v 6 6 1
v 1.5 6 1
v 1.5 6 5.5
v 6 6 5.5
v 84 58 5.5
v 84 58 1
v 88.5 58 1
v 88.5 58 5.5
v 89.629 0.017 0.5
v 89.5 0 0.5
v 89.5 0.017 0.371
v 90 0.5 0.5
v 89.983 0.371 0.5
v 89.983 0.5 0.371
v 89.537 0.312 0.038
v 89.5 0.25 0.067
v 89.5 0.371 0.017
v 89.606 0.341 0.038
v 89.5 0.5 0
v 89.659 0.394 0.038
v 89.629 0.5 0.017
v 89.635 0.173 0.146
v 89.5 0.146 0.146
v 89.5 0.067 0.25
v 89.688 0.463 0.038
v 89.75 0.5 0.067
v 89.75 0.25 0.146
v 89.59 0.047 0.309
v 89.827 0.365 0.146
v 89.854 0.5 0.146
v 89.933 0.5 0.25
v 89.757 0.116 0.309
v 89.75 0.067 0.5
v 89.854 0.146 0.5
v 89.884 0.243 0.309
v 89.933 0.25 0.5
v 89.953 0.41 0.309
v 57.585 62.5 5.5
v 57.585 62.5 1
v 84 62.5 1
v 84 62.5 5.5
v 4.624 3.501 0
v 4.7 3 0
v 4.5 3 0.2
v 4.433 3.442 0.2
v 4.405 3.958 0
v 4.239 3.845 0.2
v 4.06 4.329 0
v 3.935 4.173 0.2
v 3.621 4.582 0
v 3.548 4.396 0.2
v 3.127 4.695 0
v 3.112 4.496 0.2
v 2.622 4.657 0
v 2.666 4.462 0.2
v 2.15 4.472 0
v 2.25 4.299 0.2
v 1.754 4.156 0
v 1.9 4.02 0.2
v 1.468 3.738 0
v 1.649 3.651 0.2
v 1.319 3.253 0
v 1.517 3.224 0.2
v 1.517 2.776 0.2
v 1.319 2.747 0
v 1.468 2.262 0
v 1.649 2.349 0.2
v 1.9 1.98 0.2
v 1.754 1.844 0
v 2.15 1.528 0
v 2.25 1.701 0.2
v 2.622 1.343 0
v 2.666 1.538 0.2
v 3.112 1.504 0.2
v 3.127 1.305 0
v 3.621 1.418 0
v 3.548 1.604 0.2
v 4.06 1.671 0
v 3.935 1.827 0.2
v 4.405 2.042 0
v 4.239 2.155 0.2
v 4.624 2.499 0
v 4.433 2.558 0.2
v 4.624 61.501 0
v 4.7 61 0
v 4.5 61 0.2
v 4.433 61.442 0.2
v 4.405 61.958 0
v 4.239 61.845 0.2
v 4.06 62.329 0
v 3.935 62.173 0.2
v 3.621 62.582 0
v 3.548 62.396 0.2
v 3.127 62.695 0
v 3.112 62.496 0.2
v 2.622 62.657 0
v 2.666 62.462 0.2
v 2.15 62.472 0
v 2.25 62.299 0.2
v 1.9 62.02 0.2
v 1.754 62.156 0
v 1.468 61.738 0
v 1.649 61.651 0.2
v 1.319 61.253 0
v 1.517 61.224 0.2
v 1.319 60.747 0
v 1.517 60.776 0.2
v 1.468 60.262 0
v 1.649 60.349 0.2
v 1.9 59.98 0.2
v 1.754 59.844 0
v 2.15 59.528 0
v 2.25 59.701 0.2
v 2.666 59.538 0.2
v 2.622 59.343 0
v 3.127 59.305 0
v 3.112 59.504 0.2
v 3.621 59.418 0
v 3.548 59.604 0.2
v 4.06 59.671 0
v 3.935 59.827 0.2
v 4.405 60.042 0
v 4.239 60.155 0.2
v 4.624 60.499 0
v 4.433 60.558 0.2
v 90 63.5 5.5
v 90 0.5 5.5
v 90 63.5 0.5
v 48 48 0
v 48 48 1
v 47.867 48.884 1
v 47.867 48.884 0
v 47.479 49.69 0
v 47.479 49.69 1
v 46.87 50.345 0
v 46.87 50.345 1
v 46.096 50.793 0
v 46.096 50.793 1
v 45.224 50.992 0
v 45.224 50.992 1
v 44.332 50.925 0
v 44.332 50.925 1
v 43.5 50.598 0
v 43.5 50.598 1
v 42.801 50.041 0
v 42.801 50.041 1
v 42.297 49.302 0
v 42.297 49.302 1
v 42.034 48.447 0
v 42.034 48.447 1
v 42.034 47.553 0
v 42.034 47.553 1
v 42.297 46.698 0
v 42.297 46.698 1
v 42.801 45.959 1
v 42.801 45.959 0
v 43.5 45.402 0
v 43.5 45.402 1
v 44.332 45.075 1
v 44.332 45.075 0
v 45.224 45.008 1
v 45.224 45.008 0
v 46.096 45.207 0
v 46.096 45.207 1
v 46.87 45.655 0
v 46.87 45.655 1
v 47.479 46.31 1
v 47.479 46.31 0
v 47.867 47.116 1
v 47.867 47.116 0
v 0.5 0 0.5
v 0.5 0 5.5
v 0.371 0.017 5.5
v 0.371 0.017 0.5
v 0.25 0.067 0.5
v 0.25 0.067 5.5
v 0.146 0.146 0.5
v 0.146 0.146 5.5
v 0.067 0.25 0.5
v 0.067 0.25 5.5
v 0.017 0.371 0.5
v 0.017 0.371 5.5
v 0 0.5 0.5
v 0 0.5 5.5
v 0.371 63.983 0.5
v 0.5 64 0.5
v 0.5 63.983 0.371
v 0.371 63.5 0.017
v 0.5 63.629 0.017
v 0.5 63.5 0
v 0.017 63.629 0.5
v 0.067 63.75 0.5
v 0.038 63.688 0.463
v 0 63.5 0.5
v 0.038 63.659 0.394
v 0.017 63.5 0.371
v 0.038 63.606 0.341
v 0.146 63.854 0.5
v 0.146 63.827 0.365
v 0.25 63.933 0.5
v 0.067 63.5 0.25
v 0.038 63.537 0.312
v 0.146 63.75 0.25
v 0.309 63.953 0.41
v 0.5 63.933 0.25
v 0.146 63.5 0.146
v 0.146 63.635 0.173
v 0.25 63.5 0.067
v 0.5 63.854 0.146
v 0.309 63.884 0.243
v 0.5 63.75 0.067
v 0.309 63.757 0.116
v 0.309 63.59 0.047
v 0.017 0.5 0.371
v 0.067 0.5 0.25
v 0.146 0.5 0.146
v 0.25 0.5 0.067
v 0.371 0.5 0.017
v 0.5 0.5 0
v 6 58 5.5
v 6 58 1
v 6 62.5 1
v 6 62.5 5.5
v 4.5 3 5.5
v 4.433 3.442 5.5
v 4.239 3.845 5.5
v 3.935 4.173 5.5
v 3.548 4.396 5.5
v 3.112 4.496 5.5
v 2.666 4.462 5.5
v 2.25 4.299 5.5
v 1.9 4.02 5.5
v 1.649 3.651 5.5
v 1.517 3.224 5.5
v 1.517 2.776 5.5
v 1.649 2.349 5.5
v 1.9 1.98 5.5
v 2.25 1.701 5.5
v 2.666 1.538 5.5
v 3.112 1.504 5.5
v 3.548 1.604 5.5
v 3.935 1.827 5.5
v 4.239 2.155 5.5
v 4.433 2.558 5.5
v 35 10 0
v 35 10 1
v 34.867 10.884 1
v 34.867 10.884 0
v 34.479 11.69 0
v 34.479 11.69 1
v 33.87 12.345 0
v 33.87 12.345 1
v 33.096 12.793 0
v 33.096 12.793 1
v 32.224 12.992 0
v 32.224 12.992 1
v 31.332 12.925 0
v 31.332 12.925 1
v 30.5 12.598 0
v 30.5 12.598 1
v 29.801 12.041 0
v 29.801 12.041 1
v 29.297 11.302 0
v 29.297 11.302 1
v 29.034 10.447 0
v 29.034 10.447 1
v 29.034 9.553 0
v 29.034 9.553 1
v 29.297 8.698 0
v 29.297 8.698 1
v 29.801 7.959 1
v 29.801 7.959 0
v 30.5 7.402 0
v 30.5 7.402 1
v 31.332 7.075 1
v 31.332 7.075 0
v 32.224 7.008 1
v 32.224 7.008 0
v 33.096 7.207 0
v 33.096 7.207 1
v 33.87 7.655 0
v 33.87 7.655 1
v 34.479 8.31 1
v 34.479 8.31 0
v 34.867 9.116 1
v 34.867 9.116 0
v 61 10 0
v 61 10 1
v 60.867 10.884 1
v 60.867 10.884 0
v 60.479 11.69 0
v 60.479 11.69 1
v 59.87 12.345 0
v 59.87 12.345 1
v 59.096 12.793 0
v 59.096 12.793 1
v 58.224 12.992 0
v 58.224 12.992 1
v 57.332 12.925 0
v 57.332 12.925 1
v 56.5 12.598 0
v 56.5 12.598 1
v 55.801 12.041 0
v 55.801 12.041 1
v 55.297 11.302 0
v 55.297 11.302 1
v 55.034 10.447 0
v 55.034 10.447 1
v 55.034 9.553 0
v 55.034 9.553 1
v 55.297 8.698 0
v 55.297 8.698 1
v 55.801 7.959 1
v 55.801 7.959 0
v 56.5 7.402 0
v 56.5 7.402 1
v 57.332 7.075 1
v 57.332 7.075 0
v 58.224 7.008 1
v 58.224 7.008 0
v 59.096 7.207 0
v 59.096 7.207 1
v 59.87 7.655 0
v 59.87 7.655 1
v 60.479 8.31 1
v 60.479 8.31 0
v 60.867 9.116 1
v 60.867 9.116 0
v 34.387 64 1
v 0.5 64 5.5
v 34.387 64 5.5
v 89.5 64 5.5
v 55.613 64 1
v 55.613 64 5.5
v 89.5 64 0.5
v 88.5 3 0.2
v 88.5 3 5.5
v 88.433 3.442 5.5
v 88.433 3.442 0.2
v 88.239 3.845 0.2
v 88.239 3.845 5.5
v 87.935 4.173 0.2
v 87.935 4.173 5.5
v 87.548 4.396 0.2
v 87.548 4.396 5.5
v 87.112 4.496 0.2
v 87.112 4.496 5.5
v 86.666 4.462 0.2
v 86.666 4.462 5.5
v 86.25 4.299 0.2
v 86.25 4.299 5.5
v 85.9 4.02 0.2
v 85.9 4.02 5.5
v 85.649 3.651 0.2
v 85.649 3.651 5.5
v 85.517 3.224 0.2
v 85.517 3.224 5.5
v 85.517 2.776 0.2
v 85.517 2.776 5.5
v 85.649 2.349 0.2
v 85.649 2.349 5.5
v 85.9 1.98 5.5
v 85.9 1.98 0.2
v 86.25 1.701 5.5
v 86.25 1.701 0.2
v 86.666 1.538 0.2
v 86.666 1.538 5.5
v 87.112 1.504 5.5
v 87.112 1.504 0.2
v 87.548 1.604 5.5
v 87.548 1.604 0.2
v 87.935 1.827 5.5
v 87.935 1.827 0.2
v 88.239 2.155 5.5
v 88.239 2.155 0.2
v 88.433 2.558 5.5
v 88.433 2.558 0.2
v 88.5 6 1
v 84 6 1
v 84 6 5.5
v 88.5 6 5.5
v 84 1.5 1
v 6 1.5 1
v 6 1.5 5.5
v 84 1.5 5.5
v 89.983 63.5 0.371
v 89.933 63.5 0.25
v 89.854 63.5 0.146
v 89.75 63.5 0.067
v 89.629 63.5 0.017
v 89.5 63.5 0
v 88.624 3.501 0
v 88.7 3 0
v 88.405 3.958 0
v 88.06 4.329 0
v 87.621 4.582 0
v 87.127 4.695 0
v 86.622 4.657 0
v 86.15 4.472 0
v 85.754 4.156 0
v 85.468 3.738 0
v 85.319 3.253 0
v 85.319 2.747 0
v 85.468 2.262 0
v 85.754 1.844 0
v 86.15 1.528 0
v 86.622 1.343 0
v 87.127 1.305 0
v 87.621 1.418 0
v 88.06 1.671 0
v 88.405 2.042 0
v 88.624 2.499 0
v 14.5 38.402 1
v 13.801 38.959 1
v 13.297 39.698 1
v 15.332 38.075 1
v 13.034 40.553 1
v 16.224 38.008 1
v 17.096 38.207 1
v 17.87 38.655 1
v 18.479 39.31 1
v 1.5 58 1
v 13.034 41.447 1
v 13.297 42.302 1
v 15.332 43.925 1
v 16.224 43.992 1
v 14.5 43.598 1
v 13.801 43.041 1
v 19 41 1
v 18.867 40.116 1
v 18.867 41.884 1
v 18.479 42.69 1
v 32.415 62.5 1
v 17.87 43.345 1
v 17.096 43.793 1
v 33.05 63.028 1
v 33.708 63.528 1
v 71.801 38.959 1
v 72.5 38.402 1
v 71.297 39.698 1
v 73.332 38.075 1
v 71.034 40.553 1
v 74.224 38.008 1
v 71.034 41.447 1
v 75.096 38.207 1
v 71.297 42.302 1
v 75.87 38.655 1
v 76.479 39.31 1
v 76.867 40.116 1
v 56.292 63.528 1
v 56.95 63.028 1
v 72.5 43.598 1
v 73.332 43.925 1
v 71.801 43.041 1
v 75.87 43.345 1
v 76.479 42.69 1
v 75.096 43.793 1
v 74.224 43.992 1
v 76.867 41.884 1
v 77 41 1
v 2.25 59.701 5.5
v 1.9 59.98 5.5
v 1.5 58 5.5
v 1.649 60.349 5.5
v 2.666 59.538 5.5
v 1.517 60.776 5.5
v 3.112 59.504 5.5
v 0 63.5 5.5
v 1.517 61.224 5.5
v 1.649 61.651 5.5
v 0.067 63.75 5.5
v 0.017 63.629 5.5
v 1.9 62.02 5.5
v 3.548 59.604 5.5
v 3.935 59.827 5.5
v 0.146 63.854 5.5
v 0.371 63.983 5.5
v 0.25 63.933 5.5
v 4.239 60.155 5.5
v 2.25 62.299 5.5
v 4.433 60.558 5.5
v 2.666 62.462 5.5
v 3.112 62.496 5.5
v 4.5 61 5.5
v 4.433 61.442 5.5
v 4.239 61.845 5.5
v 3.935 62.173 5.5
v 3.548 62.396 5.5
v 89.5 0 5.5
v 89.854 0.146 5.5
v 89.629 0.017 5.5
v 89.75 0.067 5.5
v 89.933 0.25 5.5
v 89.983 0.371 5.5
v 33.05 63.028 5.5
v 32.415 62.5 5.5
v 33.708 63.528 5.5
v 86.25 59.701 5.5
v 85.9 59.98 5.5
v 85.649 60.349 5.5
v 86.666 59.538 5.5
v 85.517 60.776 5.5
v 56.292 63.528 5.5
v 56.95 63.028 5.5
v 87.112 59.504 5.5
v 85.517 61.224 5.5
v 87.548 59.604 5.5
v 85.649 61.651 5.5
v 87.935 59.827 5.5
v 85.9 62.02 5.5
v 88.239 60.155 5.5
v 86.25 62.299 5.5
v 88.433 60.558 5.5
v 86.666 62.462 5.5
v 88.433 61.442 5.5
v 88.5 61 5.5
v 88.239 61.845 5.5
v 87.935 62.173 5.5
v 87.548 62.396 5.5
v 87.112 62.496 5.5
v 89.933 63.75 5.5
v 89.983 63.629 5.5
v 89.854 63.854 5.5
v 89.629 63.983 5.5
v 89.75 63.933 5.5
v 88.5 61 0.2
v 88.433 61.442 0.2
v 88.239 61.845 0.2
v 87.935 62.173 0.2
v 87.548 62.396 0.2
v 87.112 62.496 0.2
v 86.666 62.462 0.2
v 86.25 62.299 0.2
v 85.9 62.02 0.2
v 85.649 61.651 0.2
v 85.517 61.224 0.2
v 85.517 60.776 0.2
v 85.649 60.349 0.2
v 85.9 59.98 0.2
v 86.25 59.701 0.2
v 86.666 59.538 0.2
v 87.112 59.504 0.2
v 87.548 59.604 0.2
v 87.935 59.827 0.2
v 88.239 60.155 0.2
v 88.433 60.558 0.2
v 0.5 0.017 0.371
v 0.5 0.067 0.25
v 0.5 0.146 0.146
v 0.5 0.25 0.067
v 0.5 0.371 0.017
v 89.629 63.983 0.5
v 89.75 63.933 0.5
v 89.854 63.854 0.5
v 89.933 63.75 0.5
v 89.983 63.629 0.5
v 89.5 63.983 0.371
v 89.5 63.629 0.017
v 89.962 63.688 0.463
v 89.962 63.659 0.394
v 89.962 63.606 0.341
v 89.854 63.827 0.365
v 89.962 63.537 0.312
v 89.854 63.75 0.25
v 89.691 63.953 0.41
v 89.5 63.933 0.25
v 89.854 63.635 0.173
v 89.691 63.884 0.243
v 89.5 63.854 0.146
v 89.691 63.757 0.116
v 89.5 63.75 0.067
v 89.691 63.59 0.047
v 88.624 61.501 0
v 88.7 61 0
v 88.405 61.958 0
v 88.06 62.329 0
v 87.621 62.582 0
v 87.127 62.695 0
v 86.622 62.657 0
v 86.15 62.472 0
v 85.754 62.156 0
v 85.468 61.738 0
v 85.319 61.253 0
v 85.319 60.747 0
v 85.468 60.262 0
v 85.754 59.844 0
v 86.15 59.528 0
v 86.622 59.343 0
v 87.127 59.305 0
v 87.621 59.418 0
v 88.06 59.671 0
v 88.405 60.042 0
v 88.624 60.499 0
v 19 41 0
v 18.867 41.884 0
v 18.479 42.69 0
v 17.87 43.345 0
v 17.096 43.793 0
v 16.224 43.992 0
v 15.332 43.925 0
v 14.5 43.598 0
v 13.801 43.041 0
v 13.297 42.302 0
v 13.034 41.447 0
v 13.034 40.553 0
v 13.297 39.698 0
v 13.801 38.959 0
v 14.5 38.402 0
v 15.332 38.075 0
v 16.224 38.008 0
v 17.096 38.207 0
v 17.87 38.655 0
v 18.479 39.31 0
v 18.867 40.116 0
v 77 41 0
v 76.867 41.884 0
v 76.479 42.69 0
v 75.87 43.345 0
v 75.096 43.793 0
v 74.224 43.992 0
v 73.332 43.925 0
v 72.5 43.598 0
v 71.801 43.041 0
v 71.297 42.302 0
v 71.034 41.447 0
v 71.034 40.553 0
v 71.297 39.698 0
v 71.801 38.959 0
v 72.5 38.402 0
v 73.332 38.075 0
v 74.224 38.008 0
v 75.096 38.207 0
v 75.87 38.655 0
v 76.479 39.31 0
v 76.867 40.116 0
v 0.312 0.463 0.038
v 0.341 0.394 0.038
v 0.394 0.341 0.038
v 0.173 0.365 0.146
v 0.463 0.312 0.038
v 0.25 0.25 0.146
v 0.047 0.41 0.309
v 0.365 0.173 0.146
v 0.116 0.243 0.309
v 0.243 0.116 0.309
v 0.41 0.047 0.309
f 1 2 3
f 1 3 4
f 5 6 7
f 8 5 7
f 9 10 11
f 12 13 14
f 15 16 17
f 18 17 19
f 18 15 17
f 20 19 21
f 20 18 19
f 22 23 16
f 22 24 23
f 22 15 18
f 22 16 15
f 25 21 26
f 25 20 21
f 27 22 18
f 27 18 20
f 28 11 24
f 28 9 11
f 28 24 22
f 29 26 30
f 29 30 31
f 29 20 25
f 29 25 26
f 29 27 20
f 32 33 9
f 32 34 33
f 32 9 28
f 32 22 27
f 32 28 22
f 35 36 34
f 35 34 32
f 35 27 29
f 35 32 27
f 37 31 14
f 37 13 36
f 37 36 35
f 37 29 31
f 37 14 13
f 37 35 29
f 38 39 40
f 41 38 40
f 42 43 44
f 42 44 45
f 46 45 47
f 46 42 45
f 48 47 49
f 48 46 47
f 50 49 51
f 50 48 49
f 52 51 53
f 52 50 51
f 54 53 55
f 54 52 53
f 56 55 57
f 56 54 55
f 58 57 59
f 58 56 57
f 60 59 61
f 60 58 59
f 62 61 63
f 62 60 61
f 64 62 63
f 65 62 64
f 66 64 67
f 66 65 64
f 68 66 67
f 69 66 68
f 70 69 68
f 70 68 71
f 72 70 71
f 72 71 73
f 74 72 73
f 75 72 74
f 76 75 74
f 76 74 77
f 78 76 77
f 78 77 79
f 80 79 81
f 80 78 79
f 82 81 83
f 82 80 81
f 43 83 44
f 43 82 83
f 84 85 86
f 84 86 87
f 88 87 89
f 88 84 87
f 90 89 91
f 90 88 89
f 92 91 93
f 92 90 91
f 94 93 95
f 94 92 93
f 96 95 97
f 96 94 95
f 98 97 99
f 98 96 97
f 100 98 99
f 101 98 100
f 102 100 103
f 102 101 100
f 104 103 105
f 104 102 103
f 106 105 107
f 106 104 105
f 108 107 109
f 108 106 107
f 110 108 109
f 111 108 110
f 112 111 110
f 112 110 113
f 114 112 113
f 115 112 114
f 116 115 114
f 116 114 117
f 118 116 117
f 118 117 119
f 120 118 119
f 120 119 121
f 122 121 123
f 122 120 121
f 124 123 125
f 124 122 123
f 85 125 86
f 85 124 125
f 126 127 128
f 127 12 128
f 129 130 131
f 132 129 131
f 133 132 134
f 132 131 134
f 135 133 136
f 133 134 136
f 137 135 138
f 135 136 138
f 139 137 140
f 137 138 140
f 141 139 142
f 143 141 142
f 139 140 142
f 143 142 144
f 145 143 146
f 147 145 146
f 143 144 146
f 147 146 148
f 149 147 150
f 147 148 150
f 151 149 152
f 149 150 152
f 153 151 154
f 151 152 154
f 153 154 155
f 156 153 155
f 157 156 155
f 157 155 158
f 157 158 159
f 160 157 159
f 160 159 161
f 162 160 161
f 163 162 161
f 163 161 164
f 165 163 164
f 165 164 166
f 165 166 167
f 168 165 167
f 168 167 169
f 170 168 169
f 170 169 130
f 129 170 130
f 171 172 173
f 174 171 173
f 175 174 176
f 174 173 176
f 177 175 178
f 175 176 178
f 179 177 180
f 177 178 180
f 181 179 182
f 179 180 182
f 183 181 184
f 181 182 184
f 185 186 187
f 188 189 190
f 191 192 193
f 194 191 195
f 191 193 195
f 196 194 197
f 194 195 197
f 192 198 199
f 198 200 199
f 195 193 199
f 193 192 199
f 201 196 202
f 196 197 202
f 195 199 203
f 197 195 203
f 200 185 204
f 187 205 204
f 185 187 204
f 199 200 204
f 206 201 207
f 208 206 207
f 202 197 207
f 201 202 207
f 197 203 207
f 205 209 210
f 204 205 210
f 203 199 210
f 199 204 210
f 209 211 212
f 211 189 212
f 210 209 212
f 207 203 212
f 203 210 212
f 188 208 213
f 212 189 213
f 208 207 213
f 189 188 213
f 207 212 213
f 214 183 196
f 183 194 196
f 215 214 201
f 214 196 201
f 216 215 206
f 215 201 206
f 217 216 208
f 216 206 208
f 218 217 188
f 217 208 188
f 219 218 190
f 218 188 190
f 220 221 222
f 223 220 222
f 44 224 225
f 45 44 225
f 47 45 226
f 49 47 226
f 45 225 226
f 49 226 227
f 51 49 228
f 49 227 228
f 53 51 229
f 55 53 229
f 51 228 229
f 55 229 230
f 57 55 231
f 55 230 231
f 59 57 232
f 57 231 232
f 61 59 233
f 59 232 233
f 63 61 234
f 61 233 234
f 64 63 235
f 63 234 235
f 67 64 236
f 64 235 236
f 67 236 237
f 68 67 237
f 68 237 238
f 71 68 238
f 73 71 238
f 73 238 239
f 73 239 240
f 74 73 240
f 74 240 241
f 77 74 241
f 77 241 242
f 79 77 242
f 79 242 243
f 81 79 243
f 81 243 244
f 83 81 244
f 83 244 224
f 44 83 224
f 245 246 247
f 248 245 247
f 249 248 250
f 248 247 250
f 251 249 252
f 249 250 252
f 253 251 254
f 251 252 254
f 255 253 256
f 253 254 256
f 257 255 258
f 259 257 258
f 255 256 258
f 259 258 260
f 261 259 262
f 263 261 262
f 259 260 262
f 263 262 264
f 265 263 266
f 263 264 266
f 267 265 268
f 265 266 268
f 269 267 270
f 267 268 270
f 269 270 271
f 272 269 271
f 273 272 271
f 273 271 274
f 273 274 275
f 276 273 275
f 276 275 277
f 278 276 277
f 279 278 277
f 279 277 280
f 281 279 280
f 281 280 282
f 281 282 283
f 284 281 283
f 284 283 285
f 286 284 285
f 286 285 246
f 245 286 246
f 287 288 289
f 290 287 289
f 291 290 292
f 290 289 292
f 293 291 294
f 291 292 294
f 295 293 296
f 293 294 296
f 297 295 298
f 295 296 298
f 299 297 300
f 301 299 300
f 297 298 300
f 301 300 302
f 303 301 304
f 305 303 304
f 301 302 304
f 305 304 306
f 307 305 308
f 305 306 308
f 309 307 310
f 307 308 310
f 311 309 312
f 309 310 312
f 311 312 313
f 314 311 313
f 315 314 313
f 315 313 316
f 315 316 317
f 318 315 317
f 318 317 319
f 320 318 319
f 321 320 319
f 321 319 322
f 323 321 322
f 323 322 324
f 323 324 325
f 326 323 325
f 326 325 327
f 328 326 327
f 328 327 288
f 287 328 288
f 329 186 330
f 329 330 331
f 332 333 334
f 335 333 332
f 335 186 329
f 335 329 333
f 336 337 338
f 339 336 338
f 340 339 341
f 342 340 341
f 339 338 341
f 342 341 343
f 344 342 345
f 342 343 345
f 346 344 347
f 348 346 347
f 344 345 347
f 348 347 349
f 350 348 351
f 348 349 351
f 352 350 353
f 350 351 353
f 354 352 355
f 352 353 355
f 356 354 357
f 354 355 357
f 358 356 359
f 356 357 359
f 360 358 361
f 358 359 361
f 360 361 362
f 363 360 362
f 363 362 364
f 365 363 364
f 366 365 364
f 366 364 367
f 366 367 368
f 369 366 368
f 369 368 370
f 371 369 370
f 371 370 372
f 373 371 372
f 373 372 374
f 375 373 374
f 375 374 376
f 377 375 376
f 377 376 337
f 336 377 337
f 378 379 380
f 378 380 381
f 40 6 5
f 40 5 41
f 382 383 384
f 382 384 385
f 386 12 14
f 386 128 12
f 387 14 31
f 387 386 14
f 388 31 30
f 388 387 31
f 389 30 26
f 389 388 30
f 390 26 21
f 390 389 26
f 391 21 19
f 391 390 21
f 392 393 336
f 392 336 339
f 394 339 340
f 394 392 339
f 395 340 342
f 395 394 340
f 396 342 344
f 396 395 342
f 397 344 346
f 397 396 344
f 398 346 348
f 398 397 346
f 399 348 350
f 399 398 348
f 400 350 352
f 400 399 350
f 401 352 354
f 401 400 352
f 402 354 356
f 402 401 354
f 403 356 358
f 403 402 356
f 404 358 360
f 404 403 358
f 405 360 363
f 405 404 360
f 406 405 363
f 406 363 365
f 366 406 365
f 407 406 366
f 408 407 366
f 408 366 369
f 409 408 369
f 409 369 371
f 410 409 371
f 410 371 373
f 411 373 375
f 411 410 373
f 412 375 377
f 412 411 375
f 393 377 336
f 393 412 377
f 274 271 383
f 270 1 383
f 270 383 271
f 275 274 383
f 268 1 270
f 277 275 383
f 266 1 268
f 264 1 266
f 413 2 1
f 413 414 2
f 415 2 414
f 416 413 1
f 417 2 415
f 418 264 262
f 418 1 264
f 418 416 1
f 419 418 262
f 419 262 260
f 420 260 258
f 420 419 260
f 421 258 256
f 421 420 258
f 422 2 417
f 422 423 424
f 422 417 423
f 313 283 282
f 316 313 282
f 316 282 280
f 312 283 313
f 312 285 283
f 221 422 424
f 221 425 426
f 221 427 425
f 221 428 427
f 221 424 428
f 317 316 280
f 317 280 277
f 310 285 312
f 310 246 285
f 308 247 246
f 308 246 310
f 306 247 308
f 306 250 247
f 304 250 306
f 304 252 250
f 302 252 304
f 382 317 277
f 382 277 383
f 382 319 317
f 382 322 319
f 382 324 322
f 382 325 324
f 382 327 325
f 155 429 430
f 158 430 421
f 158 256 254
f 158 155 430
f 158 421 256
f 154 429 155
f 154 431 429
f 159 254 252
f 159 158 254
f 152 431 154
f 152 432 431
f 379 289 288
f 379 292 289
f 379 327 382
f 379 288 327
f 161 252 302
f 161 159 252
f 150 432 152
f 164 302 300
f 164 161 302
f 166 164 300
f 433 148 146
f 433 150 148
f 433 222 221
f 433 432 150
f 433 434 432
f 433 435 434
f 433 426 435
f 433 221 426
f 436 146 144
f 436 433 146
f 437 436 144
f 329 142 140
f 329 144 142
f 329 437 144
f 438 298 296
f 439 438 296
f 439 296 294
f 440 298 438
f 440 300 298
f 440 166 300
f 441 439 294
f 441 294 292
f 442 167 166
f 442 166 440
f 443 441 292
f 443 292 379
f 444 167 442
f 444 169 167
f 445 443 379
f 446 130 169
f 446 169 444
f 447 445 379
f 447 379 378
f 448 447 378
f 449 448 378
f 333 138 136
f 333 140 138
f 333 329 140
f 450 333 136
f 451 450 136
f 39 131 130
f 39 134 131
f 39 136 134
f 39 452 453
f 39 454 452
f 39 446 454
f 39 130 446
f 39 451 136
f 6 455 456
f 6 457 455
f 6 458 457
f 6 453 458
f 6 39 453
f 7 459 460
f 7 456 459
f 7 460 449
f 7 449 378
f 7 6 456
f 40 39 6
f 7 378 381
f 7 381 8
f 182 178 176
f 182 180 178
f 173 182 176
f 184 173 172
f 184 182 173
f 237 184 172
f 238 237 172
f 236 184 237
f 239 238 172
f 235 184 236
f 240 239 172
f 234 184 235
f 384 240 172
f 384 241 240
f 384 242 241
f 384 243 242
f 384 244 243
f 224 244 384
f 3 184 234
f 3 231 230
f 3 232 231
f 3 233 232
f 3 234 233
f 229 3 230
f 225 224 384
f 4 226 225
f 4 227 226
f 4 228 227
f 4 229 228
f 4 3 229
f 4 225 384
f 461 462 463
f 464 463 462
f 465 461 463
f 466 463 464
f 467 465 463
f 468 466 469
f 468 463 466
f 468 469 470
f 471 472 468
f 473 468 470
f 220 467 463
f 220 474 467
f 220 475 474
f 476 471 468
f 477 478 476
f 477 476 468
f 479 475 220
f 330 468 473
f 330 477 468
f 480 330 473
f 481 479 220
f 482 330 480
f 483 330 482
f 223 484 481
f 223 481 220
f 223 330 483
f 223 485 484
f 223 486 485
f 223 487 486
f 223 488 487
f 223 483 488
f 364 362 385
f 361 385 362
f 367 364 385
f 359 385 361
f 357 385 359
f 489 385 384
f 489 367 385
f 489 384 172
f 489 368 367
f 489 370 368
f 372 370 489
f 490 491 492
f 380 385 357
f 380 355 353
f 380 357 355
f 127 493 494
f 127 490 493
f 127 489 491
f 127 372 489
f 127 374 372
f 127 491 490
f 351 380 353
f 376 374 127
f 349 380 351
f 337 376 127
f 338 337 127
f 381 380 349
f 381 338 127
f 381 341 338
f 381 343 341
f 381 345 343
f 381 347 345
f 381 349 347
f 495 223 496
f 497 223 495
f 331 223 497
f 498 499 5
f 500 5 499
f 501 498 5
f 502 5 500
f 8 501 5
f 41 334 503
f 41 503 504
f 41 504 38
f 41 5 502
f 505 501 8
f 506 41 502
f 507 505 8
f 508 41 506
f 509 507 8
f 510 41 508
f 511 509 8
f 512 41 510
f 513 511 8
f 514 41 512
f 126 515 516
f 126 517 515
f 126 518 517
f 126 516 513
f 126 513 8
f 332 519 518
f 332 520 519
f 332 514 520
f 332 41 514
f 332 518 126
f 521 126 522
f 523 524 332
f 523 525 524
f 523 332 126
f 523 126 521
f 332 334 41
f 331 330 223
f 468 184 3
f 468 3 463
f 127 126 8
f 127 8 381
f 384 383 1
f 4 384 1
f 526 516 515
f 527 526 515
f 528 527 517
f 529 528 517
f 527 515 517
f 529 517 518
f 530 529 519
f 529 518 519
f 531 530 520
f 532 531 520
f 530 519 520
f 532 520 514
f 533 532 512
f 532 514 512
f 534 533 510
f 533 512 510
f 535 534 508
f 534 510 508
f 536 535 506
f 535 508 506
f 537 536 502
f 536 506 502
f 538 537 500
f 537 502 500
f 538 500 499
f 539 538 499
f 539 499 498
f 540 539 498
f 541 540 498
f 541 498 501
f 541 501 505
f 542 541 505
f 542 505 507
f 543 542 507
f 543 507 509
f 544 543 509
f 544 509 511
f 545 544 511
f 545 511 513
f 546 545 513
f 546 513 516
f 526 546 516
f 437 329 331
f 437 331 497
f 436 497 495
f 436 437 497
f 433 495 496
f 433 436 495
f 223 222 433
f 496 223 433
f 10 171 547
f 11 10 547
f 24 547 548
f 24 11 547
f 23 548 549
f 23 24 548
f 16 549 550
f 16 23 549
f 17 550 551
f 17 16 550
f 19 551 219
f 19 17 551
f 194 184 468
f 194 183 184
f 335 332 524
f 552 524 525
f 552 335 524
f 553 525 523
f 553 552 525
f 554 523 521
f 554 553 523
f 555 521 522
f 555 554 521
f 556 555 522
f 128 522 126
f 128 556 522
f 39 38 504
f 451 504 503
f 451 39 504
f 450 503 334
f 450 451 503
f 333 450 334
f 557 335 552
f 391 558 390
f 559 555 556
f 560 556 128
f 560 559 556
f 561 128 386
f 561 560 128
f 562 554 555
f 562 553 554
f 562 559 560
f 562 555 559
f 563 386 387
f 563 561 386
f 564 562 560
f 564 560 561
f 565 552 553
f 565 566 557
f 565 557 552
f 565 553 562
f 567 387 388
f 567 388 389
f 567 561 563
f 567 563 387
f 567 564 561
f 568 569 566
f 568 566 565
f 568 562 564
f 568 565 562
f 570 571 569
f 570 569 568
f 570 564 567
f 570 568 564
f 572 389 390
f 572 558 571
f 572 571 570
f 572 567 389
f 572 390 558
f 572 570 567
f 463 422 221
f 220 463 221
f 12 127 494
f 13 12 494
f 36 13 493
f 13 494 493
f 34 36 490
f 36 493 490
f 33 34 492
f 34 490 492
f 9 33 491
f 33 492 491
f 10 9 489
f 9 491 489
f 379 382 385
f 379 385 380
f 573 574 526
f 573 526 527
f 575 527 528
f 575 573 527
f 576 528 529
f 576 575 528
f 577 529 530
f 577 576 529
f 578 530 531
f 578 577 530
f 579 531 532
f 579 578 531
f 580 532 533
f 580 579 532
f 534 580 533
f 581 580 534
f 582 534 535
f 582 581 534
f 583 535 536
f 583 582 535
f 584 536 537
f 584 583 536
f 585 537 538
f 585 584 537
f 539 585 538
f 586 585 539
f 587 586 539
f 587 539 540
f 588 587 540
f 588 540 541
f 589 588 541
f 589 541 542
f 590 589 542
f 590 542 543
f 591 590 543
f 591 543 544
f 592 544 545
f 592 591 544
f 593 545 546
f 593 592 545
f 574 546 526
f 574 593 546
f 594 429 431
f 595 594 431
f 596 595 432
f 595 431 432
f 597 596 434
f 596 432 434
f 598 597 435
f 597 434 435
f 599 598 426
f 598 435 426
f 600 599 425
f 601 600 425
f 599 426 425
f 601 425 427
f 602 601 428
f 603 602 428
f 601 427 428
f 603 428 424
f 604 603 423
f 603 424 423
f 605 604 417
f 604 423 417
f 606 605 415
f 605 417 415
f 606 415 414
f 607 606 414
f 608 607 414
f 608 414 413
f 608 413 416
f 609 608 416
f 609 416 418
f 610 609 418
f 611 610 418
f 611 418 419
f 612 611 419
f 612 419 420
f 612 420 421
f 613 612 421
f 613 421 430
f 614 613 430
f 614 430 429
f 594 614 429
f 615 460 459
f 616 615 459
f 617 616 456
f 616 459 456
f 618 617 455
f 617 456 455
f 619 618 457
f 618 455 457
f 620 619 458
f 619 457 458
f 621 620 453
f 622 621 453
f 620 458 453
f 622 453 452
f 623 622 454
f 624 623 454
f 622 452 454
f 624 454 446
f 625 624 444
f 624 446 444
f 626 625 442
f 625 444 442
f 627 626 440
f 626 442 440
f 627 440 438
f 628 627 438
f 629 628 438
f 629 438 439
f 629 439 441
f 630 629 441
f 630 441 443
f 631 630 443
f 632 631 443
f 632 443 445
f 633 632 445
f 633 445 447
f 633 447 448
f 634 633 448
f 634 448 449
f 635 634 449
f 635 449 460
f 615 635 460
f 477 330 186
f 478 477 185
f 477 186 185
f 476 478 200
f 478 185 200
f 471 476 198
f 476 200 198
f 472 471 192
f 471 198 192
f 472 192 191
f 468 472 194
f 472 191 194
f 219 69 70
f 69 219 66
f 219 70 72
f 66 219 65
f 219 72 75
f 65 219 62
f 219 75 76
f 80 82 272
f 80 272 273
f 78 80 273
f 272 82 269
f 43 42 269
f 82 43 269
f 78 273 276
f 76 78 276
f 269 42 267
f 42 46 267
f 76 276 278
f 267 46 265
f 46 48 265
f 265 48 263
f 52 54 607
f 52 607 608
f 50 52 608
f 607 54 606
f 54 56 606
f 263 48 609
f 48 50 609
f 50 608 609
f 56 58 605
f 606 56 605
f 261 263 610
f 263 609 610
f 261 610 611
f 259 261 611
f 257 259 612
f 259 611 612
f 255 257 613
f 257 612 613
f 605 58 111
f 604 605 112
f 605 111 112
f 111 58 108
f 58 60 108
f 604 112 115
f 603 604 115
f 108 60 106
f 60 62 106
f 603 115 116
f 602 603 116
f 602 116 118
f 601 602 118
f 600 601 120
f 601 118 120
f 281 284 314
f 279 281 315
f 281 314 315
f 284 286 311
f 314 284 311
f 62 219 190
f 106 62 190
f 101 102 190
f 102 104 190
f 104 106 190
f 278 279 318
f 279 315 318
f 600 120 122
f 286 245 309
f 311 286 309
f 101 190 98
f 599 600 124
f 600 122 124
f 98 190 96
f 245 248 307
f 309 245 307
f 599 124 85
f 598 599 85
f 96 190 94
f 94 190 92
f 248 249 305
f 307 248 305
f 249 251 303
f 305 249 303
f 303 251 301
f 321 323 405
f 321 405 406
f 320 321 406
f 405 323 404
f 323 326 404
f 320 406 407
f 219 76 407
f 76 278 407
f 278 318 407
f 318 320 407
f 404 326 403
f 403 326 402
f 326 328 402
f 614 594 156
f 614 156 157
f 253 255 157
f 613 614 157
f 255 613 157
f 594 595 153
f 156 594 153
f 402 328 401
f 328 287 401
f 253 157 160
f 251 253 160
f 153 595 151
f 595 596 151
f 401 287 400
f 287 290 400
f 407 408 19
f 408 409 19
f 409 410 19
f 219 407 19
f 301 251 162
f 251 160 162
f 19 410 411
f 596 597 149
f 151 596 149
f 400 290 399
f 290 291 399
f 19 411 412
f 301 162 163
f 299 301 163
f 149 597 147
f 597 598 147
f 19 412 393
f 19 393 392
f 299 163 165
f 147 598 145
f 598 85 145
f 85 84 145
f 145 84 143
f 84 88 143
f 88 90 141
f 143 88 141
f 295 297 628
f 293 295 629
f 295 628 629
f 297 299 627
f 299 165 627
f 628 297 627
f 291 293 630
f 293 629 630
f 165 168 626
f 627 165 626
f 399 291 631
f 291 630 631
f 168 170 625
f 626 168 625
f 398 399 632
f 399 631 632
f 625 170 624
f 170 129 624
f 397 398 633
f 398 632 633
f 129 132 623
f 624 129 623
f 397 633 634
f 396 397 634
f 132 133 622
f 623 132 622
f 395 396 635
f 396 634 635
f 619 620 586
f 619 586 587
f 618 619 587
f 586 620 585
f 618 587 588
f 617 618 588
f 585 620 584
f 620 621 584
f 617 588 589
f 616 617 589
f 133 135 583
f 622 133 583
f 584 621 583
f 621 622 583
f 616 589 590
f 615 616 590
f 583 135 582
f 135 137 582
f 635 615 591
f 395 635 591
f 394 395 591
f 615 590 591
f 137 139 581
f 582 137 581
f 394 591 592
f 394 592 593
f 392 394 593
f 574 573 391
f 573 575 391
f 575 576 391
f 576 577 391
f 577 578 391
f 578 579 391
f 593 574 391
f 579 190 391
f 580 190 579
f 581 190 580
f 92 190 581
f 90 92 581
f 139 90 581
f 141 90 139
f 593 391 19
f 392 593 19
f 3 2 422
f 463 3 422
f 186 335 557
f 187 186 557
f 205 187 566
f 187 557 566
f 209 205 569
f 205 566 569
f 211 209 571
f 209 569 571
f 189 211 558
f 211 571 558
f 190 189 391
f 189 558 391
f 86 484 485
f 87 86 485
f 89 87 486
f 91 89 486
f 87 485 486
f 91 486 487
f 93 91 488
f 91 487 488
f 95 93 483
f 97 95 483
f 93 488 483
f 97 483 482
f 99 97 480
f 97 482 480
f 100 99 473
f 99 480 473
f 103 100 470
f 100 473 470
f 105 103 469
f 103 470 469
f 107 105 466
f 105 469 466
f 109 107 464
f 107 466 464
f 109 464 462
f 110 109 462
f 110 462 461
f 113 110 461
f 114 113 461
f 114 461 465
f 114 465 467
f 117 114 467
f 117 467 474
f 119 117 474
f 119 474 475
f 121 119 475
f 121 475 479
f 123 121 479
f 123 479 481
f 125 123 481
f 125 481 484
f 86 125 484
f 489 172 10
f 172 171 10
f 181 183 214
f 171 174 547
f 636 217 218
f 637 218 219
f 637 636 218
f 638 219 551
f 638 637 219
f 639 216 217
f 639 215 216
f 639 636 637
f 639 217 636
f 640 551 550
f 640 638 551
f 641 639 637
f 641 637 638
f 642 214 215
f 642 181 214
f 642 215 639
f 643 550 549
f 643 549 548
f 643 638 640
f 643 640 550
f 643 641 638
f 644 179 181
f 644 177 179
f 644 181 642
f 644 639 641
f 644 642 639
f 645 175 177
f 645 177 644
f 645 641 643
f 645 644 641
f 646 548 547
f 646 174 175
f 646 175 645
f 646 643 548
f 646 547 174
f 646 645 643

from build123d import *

# Parameters (mm, degrees)
F0_W      = 90
F0_H      = 64
F1_DEPTH  = 1
F3_W      = 90
F3_H      = 64
F3_W_2    = 87
F3_H_2    = 61
F4_DEPTH  = 4.5
F5_R      = 3
F6_DEPTH  = 1.001
F8_DEPTH  = 4.501
F10_W     = 4.5
F10_H     = 4.5
F11_DEPTH = 4.5
F12_R     = 1.5
F13_DEPTH = 5.501
F14_R     = 0.5
F16_SIZE  = 0.2


# Not quite as in the source:
# - two fillets or chamfers of one size are made in one step


with BuildPart() as f1:
    # F0 (on Top) → F1 (new body)
    with BuildSketch(Plane.XY):
        with Locations((45, 32)):
            Rectangle(F0_W, F0_H)
    extrude(amount=F1_DEPTH)

    # F3 (on face) → F4 (join)
    with BuildSketch(Plane.XY.offset(1)):
        with Locations((45, 32)):
            Rectangle(F3_W, F3_H)
        with Locations((45, 32)):
            Rectangle(F3_W_2, F3_H_2, mode=Mode.SUBTRACT)
    extrude(amount=F4_DEPTH)

    # F5 (on face) → F6 (cut, through all)
    with BuildSketch(Plane.XY.offset(1)):
        with Locations((16, 41)):
            Circle(F5_R)
        with Locations((45, 48)):
            Circle(F5_R)
        with Locations((32, 10)):
            Circle(F5_R)
        with Locations((58, 10)):
            Circle(F5_R)
        with Locations((74, 41)):
            Circle(F5_R)
    extrude(amount=-F6_DEPTH, mode=Mode.SUBTRACT)

    # F7 (on face) → F8 (cut, through all)
    with BuildSketch(Plane.XY.offset(1)):
        with BuildLine():
            ThreePointArc((34.3868006709, 64), (35.920722141, 31.0823549641), (64.2, 48))
            ThreePointArc((64.2, 48), (61.9176450359, 57.079277859), (55.6131993291, 64))
            Line((55.6131993291, 64), (34.3868006709, 64))
        make_face()
    extrude(amount=F8_DEPTH, mode=Mode.SUBTRACT)

    # F10 (on face) → F11 (join, through all)
    with BuildSketch(Plane.XY.offset(1)):
        with Locations((86.25, 3.75)):
            Rectangle(F10_W, F10_H)
        with Locations((86.25, 60.25)):
            Rectangle(F10_W, F10_H)
        with Locations((3.75, 3.75)):
            Rectangle(F10_W, F10_H)
        with Locations((3.75, 60.25)):
            Rectangle(F10_W, F10_H)
    extrude(amount=F11_DEPTH)

    # F12 (on face) → F13 (cut, through all)
    with BuildSketch(Plane.XY.offset(5.5)):
        with Locations((87, 3)):
            Circle(F12_R)
        with Locations((3, 3)):
            Circle(F12_R)
        with Locations((87, 61)):
            Circle(F12_R)
        with Locations((3, 61)):
            Circle(F12_R)
    extrude(amount=-F13_DEPTH, mode=Mode.SUBTRACT)

    # F14
    f14_edges = [f1.edges().sort_by_distance(p)[0] for p in [
        (45, 64, 0),
        (0, 64, 2.75),
        (0, 0, 2.75),
        (0, 32, 0),
        (90, 64, 2.75),
        (90, 0, 2.75),
        (45, 0, 0),
        (90, 32, 0),
    ]]
    fillet(f14_edges, radius=F14_R)

    # F16
    f16_edges = [f1.edges().sort_by_distance(p)[0] for p in [
        (85.5, 61, 0),
        (85.5, 3, 0),
        (1.5, 3, 0),
        (1.5, 61, 0),
    ]]
    chamfer(f16_edges, length=F16_SIZE)


solid = f1.part
